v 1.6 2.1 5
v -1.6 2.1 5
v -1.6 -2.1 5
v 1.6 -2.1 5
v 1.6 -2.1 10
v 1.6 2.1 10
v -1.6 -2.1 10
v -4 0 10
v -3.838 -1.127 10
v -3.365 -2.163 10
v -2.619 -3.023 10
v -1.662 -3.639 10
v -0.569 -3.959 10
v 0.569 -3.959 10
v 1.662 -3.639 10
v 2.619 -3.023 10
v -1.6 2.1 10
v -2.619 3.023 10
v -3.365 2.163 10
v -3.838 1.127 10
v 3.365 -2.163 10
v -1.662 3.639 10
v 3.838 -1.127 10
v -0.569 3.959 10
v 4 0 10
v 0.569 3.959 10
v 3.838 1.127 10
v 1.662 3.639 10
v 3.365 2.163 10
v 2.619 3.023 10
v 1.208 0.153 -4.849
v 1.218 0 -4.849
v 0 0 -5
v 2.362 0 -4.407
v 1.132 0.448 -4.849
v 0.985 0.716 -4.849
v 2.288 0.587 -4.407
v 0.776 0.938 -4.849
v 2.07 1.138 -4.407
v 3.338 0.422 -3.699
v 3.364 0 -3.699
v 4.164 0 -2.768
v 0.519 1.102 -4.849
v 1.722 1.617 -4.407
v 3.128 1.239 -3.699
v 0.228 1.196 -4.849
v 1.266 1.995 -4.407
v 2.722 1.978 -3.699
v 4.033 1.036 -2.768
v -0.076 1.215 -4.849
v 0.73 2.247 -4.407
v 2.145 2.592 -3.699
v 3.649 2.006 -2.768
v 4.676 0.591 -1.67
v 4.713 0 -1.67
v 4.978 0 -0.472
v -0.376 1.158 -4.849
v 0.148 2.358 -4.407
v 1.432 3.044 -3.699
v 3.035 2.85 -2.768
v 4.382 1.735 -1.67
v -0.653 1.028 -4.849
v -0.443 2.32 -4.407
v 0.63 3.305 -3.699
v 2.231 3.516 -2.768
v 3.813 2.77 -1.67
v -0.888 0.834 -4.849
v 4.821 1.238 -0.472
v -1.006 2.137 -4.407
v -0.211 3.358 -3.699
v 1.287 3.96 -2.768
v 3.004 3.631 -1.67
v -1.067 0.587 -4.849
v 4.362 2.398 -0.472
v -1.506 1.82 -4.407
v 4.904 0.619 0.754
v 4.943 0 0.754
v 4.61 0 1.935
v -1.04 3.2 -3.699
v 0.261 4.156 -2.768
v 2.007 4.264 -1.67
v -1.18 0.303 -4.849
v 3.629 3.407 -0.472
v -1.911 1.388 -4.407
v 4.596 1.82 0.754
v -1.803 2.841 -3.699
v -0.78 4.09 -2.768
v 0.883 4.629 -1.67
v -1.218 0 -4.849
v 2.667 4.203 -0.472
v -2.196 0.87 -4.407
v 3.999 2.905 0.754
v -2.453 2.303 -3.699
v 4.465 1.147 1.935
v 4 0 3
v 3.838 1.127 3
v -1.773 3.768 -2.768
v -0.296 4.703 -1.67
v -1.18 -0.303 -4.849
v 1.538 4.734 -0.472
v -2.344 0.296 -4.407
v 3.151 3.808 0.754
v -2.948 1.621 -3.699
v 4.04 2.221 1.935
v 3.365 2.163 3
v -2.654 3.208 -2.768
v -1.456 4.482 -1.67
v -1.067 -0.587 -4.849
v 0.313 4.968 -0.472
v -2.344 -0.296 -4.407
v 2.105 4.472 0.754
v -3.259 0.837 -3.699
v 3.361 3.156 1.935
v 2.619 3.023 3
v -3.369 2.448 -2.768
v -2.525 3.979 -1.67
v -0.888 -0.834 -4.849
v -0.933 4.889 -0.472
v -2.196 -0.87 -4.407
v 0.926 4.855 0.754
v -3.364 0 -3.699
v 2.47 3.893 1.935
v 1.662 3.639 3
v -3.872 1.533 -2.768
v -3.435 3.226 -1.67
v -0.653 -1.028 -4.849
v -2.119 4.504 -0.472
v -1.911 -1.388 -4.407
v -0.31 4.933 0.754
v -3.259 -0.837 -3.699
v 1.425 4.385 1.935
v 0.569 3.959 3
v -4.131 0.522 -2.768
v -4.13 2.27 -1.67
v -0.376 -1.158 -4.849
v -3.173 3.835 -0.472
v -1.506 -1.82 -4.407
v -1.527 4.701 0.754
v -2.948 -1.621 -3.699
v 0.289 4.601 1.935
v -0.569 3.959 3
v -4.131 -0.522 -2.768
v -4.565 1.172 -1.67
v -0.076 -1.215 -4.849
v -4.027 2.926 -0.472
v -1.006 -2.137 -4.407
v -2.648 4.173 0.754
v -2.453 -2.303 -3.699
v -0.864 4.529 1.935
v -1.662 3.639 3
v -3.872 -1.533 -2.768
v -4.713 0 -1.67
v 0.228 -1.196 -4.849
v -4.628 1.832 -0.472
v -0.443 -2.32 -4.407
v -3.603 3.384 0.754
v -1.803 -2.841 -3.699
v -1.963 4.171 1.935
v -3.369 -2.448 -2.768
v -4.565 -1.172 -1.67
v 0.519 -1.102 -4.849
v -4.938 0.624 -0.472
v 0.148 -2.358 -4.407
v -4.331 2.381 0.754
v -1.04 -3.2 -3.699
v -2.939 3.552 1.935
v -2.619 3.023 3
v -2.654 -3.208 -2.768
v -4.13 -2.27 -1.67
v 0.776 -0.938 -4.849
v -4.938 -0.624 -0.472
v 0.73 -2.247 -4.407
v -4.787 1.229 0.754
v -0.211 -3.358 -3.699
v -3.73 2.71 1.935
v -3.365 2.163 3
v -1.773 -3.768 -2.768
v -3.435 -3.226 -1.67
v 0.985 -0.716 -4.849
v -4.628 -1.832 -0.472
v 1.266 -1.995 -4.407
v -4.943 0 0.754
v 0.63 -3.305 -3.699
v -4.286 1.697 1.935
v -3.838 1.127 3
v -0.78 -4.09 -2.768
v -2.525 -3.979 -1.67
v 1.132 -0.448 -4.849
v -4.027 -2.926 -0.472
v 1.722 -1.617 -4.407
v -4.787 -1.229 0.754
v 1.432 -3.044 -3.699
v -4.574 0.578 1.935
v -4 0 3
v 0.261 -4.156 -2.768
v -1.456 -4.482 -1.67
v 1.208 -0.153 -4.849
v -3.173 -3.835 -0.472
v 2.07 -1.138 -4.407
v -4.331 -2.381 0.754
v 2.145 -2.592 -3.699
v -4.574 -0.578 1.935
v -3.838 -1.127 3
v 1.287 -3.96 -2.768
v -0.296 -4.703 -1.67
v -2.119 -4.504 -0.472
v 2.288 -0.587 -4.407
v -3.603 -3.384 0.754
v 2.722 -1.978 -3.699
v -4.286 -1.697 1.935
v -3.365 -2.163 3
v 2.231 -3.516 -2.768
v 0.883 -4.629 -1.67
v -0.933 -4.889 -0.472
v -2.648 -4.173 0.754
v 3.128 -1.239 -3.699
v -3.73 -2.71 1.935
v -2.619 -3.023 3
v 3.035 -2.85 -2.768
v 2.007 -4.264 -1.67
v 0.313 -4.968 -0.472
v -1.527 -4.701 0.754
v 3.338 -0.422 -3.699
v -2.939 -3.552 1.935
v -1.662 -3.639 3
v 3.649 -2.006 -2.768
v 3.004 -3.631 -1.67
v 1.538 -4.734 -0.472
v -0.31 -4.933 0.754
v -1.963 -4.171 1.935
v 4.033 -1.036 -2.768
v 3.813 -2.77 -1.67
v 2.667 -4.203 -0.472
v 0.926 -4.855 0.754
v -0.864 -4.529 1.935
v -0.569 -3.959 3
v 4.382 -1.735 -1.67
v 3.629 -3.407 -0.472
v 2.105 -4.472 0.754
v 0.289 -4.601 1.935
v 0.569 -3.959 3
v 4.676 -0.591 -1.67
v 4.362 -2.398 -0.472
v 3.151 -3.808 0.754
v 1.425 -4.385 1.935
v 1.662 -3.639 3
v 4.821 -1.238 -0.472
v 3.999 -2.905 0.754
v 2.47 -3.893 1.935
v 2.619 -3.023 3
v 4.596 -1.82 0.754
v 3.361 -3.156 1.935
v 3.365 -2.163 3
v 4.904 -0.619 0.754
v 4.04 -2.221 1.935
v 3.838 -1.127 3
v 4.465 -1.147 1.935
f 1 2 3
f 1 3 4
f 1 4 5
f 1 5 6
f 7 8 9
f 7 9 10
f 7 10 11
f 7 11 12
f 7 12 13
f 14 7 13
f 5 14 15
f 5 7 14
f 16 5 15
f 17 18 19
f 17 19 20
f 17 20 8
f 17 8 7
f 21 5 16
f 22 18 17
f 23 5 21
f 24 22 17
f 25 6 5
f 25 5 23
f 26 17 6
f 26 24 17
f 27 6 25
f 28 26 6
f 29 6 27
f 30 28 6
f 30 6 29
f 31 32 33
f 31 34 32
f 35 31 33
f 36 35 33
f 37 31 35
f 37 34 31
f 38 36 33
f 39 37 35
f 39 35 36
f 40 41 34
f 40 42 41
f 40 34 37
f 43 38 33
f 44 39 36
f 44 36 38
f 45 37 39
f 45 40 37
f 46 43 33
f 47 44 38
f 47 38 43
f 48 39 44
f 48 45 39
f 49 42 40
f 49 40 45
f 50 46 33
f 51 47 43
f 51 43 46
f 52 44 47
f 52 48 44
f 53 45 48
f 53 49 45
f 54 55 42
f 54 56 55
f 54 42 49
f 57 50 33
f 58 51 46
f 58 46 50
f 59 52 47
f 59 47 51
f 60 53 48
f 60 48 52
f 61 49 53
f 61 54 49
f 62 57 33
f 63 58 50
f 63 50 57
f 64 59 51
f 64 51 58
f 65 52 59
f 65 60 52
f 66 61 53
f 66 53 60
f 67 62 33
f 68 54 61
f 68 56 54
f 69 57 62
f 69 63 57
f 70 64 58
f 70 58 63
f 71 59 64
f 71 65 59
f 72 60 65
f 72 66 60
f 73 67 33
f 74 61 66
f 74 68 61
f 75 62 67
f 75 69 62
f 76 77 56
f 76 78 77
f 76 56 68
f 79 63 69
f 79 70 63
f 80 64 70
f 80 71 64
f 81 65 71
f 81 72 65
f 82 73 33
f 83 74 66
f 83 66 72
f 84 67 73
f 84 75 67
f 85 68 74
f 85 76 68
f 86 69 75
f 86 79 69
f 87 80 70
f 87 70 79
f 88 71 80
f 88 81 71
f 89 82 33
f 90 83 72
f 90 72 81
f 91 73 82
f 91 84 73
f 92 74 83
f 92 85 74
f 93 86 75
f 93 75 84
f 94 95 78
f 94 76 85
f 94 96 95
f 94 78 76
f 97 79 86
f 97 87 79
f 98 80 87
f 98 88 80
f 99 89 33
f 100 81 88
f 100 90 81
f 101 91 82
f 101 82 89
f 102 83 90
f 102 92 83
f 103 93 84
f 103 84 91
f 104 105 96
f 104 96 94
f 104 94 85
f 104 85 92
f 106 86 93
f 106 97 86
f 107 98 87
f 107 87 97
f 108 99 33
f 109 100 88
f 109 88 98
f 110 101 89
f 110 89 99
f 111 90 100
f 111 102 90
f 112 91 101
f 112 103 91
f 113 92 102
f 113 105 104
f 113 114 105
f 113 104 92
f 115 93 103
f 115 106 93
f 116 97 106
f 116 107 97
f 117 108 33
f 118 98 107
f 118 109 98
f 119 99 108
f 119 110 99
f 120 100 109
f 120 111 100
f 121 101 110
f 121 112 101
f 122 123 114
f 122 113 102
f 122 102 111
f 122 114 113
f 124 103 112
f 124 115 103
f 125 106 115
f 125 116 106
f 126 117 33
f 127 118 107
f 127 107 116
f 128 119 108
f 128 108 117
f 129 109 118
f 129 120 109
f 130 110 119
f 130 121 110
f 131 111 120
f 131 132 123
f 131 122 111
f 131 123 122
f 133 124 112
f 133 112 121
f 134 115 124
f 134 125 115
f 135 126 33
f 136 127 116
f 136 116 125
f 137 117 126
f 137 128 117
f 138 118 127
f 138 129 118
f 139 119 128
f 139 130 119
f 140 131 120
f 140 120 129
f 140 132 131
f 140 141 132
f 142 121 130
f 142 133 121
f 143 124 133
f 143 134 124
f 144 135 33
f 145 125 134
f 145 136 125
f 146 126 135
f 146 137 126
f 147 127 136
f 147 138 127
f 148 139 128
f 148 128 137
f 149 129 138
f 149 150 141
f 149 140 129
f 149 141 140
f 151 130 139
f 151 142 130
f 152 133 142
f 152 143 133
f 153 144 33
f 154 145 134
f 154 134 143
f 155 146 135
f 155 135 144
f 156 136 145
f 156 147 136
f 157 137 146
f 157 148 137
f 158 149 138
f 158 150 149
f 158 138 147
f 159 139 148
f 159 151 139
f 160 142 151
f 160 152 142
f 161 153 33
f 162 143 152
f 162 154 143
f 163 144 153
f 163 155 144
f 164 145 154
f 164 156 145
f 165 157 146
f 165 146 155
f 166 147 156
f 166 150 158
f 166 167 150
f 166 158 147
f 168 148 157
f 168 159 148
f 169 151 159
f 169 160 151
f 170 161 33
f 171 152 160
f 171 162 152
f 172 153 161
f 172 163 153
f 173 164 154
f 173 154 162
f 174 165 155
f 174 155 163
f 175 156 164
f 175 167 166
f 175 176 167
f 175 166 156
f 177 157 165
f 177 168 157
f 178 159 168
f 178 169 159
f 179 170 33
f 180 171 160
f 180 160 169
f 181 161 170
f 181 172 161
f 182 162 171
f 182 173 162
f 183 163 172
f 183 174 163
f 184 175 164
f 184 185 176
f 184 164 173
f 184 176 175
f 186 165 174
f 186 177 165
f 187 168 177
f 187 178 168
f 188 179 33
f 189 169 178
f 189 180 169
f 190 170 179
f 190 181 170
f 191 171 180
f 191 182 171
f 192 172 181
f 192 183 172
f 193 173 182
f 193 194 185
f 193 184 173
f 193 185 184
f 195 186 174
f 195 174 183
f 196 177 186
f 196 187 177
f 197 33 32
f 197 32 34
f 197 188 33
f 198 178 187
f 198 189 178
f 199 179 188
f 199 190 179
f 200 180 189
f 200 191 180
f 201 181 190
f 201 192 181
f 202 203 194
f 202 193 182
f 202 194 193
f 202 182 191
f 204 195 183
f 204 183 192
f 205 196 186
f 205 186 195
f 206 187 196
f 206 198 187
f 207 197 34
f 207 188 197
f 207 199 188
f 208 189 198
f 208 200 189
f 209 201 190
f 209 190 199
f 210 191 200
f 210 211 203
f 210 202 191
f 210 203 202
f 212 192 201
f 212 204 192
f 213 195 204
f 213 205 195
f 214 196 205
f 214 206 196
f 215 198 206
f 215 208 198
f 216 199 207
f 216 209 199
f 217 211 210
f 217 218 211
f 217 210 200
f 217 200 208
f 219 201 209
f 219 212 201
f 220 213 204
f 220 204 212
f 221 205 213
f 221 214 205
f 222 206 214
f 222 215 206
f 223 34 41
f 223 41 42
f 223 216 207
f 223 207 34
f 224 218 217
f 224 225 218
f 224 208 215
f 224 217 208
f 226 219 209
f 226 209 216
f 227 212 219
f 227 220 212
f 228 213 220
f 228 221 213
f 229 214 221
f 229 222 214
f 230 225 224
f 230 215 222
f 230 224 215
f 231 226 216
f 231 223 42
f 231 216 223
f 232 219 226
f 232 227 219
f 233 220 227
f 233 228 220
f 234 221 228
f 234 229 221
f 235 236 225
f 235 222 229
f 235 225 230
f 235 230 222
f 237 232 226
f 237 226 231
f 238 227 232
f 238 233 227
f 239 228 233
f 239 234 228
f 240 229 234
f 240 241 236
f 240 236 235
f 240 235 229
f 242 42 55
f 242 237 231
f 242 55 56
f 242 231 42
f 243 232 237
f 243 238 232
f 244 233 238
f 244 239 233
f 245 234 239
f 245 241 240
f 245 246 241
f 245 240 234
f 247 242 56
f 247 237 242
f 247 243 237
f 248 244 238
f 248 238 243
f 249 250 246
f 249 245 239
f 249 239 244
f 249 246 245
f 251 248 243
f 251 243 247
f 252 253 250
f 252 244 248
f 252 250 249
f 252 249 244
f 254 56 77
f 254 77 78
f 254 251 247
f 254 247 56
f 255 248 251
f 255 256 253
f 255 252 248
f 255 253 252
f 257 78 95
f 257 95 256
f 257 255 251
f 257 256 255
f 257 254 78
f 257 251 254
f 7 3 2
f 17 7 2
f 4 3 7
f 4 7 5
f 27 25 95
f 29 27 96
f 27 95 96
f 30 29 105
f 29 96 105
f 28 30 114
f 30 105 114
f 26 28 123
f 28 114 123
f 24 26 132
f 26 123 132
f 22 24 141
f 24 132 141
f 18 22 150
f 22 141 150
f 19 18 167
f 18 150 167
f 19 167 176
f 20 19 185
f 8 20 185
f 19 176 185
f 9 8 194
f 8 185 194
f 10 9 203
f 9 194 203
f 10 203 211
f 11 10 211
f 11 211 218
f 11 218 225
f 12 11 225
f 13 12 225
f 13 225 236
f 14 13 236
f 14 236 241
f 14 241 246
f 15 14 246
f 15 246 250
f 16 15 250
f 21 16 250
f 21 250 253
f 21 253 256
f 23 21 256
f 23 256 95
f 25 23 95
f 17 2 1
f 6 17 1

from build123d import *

# Parameters (mm, degrees)
BOX_W          = 3.2
BOX_H          = 4.2
BOX_DEPTH      = 5
CYLINDER_R     = 4
CYLINDER_DEPTH = 10


with BuildPart() as stickremove:
    # Box → Box (new body)
    with BuildSketch(Plane(origin=(-1.6, -2.1, 5), x_dir=(1, 0, 0), z_dir=(0, 0, 1))):
        with Locations((1.6, 2.1)):
            Rectangle(BOX_W, BOX_H)
    extrude(amount=BOX_DEPTH)


with BuildPart() as sticklength:
    # Cylinder → Cylinder (new body)
    with BuildSketch(Plane.XY):
        Circle(CYLINDER_R)
    extrude(amount=CYLINDER_DEPTH)


with BuildPart() as sticktotal:
    # Sphere → Sphere (revolve)
    with BuildSketch(Plane.XZ):
        with BuildLine():
            ThreePointArc((0, -5), (5, 0), (0, 5))
            Line((0, 5), (0, -5))
        make_face()
    revolve(axis=Axis((0, 0, 0), (0, 0, 1)))

    # Fusion: union StickLength
    add(sticklength.part)

    # Cut: cut StickRemove
    add(stickremove.part, mode=Mode.SUBTRACT)


solid = sticktotal.part
